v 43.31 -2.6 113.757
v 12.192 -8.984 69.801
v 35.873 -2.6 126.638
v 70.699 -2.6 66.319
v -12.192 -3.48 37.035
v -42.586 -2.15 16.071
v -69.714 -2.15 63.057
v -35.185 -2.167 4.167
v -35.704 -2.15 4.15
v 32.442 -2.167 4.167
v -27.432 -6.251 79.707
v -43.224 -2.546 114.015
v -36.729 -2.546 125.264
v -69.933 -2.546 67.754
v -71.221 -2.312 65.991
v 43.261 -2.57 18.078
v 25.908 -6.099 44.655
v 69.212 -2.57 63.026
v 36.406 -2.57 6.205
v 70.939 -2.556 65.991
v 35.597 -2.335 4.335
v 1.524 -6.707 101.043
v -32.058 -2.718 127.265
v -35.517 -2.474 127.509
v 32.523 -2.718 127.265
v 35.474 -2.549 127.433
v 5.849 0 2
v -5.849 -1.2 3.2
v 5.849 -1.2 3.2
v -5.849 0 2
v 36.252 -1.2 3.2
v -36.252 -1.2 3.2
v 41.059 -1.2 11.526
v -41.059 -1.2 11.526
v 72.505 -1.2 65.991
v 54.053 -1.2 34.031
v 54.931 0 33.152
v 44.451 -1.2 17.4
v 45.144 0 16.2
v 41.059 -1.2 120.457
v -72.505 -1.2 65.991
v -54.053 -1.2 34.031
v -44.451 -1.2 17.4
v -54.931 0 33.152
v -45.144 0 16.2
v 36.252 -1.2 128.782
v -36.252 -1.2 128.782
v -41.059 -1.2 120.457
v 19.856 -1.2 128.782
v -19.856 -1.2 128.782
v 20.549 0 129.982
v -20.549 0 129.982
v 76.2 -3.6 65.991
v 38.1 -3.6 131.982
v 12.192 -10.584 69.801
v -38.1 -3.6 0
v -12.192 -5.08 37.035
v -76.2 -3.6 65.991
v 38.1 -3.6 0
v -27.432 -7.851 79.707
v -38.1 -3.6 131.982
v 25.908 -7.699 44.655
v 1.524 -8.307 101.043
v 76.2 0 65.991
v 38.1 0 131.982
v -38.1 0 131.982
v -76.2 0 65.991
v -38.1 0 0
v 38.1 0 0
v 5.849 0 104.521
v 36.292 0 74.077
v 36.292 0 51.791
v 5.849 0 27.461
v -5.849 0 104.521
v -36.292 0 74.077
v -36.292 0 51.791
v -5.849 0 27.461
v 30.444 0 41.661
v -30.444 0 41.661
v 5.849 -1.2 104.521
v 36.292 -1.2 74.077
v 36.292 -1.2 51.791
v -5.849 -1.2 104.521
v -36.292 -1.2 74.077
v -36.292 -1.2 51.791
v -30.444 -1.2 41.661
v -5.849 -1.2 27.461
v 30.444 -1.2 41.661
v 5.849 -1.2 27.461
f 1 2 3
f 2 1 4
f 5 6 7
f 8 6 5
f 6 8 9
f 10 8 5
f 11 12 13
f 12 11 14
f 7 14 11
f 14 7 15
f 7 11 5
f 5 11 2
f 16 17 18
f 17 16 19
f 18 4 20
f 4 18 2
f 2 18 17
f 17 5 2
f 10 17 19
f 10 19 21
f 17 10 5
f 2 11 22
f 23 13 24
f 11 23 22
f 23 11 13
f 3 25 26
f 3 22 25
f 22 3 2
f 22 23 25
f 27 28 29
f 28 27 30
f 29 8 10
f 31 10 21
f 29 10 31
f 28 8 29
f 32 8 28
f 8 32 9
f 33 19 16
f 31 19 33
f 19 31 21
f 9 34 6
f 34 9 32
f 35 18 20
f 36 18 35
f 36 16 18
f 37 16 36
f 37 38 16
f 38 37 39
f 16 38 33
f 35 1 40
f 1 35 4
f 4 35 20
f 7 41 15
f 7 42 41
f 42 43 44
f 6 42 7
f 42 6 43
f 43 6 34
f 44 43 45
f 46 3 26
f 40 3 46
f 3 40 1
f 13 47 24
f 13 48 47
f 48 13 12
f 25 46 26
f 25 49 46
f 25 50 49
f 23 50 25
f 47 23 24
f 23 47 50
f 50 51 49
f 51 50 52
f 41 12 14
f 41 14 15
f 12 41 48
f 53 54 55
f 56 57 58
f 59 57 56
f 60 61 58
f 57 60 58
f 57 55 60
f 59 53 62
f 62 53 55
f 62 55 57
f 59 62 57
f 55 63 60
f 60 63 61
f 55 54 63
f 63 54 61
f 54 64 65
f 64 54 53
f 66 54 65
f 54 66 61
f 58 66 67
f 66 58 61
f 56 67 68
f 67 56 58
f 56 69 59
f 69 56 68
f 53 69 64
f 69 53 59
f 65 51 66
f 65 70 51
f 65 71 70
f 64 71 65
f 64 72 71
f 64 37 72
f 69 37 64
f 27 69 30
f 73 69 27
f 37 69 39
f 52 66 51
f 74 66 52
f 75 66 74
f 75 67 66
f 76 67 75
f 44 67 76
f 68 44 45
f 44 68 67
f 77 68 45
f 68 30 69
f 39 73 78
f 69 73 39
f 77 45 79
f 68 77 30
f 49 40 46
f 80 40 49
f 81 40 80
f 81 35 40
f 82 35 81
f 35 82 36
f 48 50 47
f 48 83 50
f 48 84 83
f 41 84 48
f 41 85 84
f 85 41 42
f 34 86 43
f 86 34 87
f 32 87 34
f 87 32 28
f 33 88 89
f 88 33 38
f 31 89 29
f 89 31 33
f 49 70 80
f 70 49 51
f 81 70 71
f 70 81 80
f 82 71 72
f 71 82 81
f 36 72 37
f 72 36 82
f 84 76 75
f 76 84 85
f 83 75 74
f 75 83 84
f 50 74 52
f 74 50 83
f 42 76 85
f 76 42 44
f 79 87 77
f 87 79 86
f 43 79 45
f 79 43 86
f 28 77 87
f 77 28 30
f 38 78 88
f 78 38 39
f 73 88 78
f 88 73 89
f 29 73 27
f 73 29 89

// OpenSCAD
// Hexagon wall tile v32 — parametric rebuild of v30
// Front: identical low-poly facets to v30 (same facet angles at every size).
// Edge profile: identical on every size (edge depth, rim width) so tiles butt flush.
// Back: six corner pads for 1" (25 mm) double-sided mounting tape.
// v32: tape pads are flat plates hung from the rim with an air gap to the front skin,
//      so no internal wall touches the skin -> no "ghost" lines on the front face.
// Prints upright on a flat edge with NO supports (every downward edge is 45° or steeper).
//
// Export one size at a time, e.g.:
//   openscad -D size_in=6 -o hex_tile_v32_6in.stl hex_wall_tile_v32.scad

/* [Size] */
size_in       = 6;      // point-to-point width in inches (3, 6, 10 ...)

/* [Edge profile — keep identical across sizes] */
edge_depth    = 3.6;    // depth of the outer edge, back plane to front face (mm)
rim           = 2.0;    // perimeter wall thickness at the back plane (mm)

/* [Front skin] */
skin          = 1.6;    // front skin thickness (mm) — 4 lines at 0.4 mm, same on all sizes

/* [Tape pads] */
tape_width    = 25.4;   // tape width (mm)
pad_margin    = 3;      // extra pad width beyond the tape (mm)
pad_max_frac  = 0.45;   // pad never larger than this fraction of the tile radius (keeps 3" usable)
pad_plate     = 1.2;    // thickness of the pad plates (mm)
pad_gap       = 0.8;    // minimum air gap between pads and the front skin (mm) — keeps the front clean
pad_recess    = 0;      // pads set back from the rim (mm); >0 lets the rim touch the wall,
                        // but near the edges the plate is then trimmed thinner to keep pad_gap

/* [Output] */
orient_for_print = true; // stand upright on a flat edge, back facing +Y

/* [Hidden] */
R   = size_in * 25.4 / 2;         // corner radius
AP  = R * cos(30);                // apothem
PAD = min(tape_width + pad_margin, R * pad_max_frac);

// Normalised front geometry from v30 (x, y in units of R; z = relief above edge, units of R)
FP = [[1,0,0],[0.5,0.866025,0],[-0.5,0.866025,0],[-1,0,0],[-0.5,-0.866025,0],[0.5,-0.866025,0],
      [0.16,0.05,0.091654],[-0.16,-0.38,0.019428],[-0.36,0.18,0.05579],[0.34,-0.28,0.053795],[0.02,0.46,0.061766]];
FACES = [[0,6,1],[4,3,7],[5,4,7],[8,3,2],[7,3,8],[7,8,6],[5,9,0],[9,6,0],[9,7,6],[5,7,9],
         [6,8,10],[8,2,10],[6,10,1],[10,2,1],
         [1,12,11,0],[2,13,12,1],[3,14,13,2],[4,15,14,3],[5,16,15,4],[0,11,16,5],
         [11,12,13,14,15,16]];
RELIEF_MAX = 0.091654 * R;
D = edge_depth + RELIEF_MAX + 1;  // max depth used for chamfers

// Solid bounded by the faceted front (shifted by dz) and a flat back at z = zb
module body(dz = 0, zb = 0) {
    pts = concat(
        [for (p = FP) [p[0]*R, p[1]*R, edge_depth + p[2]*R + dz]],
        [for (i = [0:5]) [FP[i][0]*R, FP[i][1]*R, zb]]);
    polyhedron(points = pts, faces = FACES, convexity = 4);
}

module hex2d(apothem) { circle(r = apothem / cos(30), $fn = 6); }

// Back cavity: behind the skin, inside the rim; rim inner faces slope 45° so nothing needs support
module cavity(extra = 0) {
    H  = D + 2;
    a0 = AP - rim - extra + 1;             // apothem at z = -1
    intersection() {
        body(dz = -skin - extra, zb = -1);
        translate([0, 0, -1]) linear_extrude(height = H, scale = (a0 - H) / a0) hex2d(a0);
    }
}

// Corner pad footprint (2D), k = corner index 0..5:
// the corner region of the inner hex, PAD wide, long enough to hold a PAD x PAD square of tape
module pad_core(k) {
    U0  = (AP - rim) / cos(30);                    // inner corner distance from centre
    LEN = PAD / (2 * tan(60)) + PAD + 1;           // apex taper + full square + margin
    intersection() {
        hex2d(AP - rim + 0.3);                     // overlap 0.3 mm into the rim to fuse
        rotate(60 * k) translate([U0 - LEN, -PAD / 2]) square([LEN + 5, PAD]);
    }
}

// In-plane self-support: printed upright, a vertical plate needs every downward edge at >= 45°.
// Sweep each pad toward the nearest rim side below it at 45° (or straight down for bottom corners).
SWEEP = [[1, -1], [1, -1], [-1, -1], [-1, -1], [0, -1], [0, -1]];
module pad_fp(k) {
    intersection() {
        hex2d(AP - rim + 0.3);
        hull() { pad_core(k); translate(SWEEP[k] * R) pad_core(k); }
    }
}

module pads() {
    intersection() {
        body(dz = -skin - pad_gap, zb = -1);       // never closer than pad_gap to the skin
        translate([0, 0, pad_recess]) linear_extrude(pad_plate) for (k = [0:5]) pad_fp(k);
    }
}

module tile() {
    union() {
        difference() { body(); cavity(); }
        pads();
    }
}

if (orient_for_print)
    translate([0, 0, AP]) rotate([90, 0, 0]) tile();
else
    tile();
